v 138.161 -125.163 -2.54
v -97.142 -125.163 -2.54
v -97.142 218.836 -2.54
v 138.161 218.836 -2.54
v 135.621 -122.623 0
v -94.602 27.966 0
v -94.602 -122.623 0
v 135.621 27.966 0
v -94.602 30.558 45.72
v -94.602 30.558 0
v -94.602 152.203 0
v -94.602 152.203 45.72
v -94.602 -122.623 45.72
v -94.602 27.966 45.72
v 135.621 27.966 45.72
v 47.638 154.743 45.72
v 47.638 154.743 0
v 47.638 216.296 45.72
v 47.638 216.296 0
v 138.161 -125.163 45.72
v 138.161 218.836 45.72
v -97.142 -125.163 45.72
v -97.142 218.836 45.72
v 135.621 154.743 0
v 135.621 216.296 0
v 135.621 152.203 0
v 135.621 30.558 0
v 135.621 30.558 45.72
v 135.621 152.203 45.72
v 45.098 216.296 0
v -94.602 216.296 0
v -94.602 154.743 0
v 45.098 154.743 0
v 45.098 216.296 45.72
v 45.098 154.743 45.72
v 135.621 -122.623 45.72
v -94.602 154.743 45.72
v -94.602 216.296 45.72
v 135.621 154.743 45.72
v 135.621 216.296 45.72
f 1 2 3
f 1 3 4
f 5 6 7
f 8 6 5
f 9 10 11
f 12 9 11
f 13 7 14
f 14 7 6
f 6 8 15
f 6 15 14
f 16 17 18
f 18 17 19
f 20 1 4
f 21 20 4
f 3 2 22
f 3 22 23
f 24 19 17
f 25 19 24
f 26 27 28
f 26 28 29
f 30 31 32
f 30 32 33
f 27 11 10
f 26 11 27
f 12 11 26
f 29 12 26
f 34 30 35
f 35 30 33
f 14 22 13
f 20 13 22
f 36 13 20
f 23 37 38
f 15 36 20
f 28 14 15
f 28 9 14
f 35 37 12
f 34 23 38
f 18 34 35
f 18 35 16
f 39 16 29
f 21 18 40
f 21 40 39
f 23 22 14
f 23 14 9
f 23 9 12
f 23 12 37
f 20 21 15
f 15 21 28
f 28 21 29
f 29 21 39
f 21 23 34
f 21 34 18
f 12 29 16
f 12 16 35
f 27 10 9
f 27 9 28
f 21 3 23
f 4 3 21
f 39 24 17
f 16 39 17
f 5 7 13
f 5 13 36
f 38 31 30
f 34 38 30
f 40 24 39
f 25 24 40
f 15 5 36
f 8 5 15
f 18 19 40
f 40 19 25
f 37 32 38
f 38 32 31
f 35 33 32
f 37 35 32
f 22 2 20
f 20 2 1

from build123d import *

# Parameters (mm, degrees)
SKETCH1_W           = 230.223051784
SKETCH1_H           = 338.919319135
BOSS_EXTRUDE1_DEPTH = 45.72
SHELL1_T            = 2.54
BOSS_EXTRUDE2_DEPTH = 45.72


with BuildPart() as part:
    # Sketch1 → Boss-Extrude1 (new body)
    with BuildSketch(Plane.XY):
        with Locations((20.509326923, 46.836837465)):
            Rectangle(SKETCH1_W, SKETCH1_H)
    extrude(amount=BOSS_EXTRUDE1_DEPTH)

    # Shell1
    shell1_openings = [part.faces().sort_by_distance(p)[0] for p in [
        (20.509326923, 46.836837464, 45.72),
    ]]
    offset(amount=SHELL1_T, openings=shell1_openings, kind=Kind.INTERSECTION)

    # Sketch2 → Boss-Extrude2 (add)
    with BuildSketch(Plane.XY):
        Polygon((45.097801031, 154.743483449), (-94.602198969, 154.743483449), (-94.602198969, 152.203483449), (-84.918790084, 152.203483449), (135.620852815, 152.203483449), (135.620852815, 154.743483449), (47.637801031, 154.743483449), (47.637801031, 216.296497032), (45.097801031, 216.296497032), align=None)
        Polygon((-94.602198969, 29.235642098), (-94.602198969, 30.557556356), (135.620852815, 30.557556356), (135.620852815, 27.965642098), (-94.602198969, 27.965642098), align=None)
    extrude(amount=BOSS_EXTRUDE2_DEPTH)


solid = part.part
